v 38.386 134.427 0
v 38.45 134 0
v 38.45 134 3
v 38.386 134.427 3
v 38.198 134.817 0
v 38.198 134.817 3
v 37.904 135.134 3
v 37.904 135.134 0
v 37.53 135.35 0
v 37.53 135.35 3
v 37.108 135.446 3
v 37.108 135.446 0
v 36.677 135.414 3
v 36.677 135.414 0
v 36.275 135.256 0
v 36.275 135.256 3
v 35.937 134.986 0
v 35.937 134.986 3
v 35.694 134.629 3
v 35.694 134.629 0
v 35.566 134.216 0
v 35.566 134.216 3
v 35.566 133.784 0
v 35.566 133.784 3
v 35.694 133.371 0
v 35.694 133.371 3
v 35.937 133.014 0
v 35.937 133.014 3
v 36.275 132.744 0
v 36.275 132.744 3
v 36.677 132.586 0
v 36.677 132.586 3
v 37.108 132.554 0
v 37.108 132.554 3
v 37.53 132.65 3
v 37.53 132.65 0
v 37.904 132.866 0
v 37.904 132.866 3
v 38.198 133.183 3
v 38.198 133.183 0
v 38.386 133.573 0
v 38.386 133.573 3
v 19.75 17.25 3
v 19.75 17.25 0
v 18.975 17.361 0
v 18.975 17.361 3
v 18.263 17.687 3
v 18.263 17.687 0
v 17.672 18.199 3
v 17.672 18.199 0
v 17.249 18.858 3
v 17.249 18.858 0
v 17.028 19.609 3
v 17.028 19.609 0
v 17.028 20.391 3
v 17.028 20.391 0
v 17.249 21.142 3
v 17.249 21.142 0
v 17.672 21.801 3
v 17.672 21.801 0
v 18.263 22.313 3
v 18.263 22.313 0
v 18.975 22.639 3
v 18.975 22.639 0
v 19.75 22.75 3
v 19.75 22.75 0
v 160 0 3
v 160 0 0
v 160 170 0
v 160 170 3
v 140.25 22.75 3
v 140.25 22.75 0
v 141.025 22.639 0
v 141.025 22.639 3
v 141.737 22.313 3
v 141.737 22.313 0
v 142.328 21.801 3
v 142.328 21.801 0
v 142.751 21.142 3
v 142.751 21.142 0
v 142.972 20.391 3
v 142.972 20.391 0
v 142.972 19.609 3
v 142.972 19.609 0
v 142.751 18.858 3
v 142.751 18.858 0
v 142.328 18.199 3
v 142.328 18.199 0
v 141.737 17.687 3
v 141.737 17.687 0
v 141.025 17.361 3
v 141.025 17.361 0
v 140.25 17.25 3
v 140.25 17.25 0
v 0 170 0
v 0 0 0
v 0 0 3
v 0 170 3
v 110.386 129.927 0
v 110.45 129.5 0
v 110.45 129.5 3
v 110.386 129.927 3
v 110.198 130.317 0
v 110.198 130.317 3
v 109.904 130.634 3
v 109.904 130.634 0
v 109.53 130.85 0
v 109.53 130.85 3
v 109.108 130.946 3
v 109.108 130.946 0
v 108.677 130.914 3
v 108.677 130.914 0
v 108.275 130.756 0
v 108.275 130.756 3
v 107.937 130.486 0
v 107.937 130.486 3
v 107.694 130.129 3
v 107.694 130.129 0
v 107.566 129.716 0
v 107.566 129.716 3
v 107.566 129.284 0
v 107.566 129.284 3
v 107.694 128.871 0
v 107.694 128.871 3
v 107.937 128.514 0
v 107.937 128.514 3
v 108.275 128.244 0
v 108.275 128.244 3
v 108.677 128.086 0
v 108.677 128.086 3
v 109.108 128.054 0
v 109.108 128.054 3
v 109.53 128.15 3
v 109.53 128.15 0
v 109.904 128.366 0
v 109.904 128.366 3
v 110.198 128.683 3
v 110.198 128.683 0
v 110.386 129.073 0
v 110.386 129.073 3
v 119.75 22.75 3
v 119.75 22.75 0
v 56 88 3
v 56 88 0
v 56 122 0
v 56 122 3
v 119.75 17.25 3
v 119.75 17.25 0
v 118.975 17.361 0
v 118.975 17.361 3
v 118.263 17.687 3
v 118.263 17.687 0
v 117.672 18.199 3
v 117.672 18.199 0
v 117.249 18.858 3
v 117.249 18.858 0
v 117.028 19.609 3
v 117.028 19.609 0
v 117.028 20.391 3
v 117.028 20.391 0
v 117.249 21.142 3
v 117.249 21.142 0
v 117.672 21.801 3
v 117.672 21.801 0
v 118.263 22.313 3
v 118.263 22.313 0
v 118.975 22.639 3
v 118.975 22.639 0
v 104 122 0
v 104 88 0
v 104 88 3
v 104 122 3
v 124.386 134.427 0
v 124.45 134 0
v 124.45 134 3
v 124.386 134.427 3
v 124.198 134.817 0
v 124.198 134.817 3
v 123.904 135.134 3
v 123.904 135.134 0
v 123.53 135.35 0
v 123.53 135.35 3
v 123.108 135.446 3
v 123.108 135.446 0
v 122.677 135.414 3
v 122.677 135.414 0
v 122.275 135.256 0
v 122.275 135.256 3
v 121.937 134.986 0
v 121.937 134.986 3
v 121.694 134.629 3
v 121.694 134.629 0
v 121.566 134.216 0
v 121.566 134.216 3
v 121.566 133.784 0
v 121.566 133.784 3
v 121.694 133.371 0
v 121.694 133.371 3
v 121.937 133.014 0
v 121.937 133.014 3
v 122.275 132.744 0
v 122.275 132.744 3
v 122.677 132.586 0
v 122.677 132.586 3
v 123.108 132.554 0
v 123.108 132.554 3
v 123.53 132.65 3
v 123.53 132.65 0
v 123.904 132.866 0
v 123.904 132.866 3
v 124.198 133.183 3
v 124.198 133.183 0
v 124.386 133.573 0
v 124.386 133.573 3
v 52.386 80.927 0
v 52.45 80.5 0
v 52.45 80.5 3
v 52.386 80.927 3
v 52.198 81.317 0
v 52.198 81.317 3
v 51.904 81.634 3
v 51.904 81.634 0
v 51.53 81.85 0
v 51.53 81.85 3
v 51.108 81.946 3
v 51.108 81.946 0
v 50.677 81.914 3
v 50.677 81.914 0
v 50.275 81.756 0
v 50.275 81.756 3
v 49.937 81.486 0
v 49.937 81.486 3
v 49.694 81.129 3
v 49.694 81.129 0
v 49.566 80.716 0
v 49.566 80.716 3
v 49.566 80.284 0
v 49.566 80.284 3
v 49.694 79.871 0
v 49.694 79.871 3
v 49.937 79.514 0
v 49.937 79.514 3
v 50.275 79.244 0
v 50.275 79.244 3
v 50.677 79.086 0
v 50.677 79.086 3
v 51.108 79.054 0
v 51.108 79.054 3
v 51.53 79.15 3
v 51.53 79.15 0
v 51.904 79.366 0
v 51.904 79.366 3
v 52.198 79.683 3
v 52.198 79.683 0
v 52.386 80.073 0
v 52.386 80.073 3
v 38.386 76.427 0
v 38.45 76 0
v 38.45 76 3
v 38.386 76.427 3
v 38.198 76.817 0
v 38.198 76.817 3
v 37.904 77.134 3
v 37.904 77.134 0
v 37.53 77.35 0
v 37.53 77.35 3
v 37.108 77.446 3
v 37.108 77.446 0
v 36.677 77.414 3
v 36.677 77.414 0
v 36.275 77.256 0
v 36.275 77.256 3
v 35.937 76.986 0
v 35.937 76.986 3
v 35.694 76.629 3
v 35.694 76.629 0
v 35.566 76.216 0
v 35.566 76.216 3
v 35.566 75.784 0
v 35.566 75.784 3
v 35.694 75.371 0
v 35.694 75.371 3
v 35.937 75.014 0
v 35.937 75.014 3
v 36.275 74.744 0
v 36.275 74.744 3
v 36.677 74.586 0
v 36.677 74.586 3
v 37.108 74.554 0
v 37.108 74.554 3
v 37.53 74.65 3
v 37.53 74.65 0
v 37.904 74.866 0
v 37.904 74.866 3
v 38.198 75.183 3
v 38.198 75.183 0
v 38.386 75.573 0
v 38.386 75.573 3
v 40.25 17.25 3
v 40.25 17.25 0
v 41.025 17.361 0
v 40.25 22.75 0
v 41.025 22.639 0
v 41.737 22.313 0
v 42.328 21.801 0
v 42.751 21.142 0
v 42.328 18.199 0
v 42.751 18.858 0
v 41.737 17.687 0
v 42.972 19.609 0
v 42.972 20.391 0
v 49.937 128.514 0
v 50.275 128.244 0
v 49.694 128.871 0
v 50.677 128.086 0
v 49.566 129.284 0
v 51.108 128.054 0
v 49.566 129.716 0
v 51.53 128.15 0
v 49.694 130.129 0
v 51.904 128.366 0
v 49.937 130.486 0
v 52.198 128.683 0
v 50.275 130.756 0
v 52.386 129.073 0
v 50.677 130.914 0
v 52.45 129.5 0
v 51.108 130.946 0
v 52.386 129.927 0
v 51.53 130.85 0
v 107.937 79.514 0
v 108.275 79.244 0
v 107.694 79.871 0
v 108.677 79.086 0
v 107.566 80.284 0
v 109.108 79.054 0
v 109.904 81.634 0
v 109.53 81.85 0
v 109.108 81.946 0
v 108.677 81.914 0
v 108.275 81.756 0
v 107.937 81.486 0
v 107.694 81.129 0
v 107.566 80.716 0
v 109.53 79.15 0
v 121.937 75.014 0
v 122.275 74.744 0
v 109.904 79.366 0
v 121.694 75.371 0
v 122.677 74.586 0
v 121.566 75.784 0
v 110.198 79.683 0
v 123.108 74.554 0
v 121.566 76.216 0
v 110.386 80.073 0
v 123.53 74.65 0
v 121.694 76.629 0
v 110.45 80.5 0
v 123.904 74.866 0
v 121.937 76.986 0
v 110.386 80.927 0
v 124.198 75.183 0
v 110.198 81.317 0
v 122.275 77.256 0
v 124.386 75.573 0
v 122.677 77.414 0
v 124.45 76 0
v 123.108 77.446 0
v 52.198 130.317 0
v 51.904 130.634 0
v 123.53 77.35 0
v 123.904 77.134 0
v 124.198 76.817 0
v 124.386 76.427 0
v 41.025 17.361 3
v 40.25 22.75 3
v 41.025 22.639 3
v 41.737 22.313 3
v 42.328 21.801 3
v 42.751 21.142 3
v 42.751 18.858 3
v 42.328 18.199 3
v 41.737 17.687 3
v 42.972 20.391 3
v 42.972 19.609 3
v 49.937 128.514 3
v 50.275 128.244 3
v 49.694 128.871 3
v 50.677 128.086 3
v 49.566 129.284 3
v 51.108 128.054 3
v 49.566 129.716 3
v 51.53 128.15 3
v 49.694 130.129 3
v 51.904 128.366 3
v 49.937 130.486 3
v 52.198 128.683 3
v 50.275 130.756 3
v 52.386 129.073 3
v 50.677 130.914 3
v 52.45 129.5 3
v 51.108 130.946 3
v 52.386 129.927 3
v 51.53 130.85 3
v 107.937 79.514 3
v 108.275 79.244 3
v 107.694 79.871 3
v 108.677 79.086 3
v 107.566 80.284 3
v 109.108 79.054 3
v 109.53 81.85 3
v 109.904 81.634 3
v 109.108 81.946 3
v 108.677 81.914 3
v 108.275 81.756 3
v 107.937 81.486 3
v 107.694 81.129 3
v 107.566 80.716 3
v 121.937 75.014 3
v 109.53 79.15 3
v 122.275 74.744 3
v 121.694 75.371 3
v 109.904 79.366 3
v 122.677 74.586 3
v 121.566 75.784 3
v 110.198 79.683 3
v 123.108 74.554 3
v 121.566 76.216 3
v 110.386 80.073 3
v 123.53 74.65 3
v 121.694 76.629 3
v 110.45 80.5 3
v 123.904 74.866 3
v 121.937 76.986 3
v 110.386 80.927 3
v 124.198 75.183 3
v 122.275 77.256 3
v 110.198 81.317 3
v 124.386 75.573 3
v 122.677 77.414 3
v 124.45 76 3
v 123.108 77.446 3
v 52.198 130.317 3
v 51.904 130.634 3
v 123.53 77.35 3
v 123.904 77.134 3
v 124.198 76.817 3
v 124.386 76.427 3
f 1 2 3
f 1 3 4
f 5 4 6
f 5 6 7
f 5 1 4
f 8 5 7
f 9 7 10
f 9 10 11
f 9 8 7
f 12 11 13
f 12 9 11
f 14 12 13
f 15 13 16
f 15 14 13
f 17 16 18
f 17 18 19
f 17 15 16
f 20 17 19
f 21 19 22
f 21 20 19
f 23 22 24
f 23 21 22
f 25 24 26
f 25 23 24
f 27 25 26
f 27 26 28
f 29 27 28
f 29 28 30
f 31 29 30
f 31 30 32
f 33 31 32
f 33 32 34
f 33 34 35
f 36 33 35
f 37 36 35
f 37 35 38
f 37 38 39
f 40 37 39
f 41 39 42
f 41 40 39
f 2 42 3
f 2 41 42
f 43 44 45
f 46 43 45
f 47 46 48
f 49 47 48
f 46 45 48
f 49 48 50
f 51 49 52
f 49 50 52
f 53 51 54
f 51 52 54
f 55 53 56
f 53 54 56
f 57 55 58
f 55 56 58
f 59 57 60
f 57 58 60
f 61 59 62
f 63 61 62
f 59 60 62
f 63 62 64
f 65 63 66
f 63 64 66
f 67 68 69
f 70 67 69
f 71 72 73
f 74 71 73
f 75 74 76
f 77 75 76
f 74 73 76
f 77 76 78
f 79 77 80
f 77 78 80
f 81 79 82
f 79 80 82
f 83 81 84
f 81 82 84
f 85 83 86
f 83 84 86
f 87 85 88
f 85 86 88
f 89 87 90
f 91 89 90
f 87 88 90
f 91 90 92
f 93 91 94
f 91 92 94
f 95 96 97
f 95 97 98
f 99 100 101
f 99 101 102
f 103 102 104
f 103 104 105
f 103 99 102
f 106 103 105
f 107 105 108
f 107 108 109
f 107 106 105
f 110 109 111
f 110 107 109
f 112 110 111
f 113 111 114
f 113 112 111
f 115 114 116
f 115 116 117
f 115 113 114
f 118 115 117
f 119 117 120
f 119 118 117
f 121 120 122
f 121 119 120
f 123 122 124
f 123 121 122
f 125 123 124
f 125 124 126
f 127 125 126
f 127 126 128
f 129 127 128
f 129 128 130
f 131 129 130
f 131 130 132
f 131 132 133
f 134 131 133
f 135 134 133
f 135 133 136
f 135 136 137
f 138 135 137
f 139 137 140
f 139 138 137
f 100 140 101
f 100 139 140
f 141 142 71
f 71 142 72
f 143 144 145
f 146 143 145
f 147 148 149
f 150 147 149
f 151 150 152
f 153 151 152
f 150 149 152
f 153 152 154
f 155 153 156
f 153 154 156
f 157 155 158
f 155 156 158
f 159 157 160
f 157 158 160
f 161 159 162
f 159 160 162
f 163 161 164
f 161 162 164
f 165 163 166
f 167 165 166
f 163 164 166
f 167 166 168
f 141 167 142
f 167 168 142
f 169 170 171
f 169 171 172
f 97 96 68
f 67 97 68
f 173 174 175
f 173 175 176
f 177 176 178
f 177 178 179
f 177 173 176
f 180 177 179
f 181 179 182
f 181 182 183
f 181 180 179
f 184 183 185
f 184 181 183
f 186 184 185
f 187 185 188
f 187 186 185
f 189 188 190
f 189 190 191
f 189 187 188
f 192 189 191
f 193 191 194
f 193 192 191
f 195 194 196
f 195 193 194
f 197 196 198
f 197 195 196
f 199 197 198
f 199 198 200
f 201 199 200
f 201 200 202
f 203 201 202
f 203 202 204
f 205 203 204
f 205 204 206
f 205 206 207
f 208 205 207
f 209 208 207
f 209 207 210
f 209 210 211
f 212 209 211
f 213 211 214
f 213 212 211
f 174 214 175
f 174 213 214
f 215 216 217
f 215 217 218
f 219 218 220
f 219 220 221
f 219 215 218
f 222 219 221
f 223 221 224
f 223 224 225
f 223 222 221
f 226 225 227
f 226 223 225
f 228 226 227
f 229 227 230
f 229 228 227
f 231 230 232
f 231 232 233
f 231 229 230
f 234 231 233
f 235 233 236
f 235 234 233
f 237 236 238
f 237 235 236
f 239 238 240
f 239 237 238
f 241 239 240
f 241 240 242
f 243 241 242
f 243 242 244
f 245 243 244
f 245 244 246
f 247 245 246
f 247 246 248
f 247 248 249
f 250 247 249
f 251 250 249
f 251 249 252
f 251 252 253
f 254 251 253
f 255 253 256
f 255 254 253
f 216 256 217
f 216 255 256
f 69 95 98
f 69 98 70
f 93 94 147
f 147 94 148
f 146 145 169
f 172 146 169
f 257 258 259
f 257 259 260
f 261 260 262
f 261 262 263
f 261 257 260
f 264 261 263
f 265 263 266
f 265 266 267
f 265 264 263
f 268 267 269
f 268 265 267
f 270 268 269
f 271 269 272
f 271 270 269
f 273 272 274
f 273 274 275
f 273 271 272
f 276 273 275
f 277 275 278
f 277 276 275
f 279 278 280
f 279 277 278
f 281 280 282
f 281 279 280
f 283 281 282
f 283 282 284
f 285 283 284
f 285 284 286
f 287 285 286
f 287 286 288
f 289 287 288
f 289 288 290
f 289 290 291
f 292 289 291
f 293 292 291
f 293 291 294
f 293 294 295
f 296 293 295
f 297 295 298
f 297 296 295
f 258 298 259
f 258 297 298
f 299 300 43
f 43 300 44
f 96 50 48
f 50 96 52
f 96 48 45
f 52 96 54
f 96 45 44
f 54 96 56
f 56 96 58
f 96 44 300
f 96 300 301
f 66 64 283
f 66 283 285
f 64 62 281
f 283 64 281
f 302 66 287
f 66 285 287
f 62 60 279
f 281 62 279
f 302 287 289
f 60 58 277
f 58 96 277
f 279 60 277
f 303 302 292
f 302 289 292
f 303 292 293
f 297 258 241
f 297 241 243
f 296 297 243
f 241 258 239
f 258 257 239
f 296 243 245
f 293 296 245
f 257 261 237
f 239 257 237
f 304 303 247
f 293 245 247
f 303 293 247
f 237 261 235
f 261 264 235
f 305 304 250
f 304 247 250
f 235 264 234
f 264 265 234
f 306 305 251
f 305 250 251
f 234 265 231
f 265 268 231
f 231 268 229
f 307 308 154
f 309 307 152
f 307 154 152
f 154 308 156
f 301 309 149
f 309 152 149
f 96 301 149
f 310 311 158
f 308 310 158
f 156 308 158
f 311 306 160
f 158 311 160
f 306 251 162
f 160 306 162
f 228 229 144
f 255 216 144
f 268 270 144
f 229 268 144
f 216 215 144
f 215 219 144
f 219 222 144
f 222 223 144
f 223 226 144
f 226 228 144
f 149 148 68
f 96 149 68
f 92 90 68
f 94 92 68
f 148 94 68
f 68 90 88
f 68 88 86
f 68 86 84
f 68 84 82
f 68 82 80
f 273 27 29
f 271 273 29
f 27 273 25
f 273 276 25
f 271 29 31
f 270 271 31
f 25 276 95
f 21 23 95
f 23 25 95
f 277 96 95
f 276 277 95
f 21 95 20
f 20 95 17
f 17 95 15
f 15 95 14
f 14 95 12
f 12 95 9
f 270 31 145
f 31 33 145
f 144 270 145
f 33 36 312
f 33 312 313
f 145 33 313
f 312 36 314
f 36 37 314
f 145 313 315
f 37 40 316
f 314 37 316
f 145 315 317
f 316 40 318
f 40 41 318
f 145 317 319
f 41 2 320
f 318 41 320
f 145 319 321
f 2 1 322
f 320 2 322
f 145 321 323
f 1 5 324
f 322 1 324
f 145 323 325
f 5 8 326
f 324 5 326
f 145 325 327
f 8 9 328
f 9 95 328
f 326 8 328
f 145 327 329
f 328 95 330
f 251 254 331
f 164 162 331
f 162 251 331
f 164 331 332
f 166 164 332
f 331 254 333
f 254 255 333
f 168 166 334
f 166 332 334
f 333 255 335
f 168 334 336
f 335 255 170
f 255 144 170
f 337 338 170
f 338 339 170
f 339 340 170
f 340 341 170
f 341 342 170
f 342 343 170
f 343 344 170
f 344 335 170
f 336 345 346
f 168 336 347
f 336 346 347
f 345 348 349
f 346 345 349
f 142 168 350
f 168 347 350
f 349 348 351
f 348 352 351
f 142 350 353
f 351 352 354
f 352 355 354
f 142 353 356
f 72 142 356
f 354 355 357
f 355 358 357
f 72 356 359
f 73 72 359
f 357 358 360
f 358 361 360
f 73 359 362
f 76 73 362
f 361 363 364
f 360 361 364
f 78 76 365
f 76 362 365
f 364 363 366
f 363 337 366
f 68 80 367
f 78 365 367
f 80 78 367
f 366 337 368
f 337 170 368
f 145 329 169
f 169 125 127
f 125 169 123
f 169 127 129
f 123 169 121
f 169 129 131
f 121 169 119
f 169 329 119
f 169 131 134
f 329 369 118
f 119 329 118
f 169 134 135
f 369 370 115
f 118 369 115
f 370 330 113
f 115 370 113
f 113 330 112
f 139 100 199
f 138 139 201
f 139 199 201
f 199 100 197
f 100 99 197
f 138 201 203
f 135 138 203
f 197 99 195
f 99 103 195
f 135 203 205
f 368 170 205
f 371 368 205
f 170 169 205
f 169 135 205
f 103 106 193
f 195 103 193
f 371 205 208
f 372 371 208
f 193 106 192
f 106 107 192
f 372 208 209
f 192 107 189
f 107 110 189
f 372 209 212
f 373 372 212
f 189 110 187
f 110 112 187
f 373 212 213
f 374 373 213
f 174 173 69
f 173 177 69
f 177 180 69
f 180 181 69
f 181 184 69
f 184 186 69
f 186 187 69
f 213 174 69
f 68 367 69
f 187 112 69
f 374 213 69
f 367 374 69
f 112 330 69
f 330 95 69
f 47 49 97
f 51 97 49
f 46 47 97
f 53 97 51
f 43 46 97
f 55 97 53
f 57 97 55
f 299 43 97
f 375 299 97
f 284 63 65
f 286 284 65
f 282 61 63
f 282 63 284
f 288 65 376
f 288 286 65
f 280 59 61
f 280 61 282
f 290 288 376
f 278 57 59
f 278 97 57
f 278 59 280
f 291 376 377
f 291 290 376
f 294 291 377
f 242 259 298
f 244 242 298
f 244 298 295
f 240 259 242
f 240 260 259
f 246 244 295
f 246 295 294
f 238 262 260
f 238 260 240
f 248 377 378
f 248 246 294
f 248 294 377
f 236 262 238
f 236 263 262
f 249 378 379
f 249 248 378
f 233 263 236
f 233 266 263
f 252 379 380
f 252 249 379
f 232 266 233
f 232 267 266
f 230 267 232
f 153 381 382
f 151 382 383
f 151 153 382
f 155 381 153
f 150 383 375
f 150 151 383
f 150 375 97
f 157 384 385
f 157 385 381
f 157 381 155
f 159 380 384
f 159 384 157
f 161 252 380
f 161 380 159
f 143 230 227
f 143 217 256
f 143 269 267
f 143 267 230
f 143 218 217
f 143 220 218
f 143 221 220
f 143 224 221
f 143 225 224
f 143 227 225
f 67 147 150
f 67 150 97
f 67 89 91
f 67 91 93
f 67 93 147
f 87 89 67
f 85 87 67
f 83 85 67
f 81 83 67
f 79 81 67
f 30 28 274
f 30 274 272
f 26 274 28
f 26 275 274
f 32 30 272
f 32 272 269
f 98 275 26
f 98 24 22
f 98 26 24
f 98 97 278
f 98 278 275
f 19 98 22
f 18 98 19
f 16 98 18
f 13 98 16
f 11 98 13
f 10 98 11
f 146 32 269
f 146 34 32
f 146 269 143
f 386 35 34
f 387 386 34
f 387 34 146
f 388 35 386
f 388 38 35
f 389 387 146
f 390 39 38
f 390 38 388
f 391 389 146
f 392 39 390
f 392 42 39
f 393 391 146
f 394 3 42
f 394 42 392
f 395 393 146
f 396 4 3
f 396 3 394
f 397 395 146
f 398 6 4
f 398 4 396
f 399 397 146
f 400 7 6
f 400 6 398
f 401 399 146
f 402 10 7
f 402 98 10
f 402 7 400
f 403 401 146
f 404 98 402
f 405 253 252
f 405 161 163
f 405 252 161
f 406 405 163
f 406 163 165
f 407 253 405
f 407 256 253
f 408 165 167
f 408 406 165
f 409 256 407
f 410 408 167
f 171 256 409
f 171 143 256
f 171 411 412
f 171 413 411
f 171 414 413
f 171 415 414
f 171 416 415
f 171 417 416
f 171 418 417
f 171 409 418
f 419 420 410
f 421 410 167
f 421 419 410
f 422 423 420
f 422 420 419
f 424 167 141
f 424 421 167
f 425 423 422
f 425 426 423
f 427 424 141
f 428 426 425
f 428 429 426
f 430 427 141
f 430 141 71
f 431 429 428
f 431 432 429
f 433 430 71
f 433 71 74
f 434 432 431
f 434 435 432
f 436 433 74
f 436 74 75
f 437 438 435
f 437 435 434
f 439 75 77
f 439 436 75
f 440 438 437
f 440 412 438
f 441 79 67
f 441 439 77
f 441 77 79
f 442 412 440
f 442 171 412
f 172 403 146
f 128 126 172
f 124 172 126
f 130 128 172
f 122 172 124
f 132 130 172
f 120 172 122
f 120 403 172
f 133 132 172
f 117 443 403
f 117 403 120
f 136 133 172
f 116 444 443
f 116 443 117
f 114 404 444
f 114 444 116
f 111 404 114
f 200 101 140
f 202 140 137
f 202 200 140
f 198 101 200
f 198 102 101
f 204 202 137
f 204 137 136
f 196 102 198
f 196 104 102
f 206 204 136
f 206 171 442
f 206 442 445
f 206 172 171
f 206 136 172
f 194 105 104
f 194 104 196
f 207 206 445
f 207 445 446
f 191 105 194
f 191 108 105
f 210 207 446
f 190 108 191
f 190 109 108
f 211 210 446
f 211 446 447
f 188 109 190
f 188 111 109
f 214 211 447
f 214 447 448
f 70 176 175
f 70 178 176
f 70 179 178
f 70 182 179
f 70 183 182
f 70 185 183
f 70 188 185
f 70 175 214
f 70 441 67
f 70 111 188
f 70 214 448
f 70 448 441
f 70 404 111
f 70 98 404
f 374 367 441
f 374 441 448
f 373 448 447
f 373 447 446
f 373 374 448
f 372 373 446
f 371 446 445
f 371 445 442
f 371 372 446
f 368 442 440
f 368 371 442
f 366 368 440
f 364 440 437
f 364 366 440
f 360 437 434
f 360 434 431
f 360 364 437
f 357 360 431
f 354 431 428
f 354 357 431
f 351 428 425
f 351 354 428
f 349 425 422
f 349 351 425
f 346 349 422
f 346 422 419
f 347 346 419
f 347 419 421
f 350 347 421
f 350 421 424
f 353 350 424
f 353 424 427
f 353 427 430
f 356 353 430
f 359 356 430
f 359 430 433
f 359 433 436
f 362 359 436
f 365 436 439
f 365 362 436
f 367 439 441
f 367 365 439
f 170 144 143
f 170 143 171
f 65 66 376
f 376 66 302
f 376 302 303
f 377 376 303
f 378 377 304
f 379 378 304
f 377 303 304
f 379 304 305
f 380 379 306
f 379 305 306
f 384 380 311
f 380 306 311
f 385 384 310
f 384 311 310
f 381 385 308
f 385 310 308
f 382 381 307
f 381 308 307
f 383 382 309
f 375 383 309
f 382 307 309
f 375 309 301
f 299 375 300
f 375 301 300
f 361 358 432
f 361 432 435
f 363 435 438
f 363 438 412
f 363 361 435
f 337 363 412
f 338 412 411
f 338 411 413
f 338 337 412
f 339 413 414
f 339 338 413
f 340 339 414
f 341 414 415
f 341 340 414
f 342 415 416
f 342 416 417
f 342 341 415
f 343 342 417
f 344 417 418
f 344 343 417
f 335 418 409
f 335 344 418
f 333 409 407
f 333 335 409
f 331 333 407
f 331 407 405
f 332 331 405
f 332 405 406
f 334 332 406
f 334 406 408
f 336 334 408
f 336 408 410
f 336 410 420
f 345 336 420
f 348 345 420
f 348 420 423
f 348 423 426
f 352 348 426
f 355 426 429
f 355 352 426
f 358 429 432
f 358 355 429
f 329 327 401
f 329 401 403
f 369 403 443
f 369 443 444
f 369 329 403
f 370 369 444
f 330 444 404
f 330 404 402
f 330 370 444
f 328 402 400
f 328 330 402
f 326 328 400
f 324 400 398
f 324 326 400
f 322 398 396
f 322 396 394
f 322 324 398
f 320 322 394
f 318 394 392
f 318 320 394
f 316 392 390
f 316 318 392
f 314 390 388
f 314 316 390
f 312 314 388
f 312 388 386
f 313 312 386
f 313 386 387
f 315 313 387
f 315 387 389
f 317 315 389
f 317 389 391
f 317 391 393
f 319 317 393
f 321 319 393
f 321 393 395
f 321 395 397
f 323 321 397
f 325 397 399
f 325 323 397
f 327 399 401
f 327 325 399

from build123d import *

# Parameters (mm, degrees)
COMPUTE_COMBO_PLATE_W   = 160
COMPUTE_COMBO_PLATE_H   = 170
COMPUTE_COMBO_PLATE_R   = 1.45
COMPUTE_COMBO_PLATE_W_2 = 48
COMPUTE_COMBO_PLATE_H_2 = 34
F_3MM_DEPTH             = 3


with BuildPart() as part:
    # 外形与孔位_compute_combo_plate → 板厚_3mm (new body)
    with BuildSketch(Plane.XY):
        with Locations((80, 85)):
            Rectangle(COMPUTE_COMBO_PLATE_W, COMPUTE_COMBO_PLATE_H)
        with Locations((51, 80.5)):
            Circle(COMPUTE_COMBO_PLATE_R, mode=Mode.SUBTRACT)
        with Locations((51, 129.5)):
            Circle(COMPUTE_COMBO_PLATE_R, mode=Mode.SUBTRACT)
        with Locations((109, 80.5)):
            Circle(COMPUTE_COMBO_PLATE_R, mode=Mode.SUBTRACT)
        with Locations((109, 129.5)):
            Circle(COMPUTE_COMBO_PLATE_R, mode=Mode.SUBTRACT)
        with Locations((37, 76)):
            Circle(COMPUTE_COMBO_PLATE_R, mode=Mode.SUBTRACT)
        with Locations((37, 134)):
            Circle(COMPUTE_COMBO_PLATE_R, mode=Mode.SUBTRACT)
        with Locations((123, 76)):
            Circle(COMPUTE_COMBO_PLATE_R, mode=Mode.SUBTRACT)
        with Locations((123, 134)):
            Circle(COMPUTE_COMBO_PLATE_R, mode=Mode.SUBTRACT)
        with Locations((80, 105)):
            Rectangle(COMPUTE_COMBO_PLATE_W_2, COMPUTE_COMBO_PLATE_H_2, mode=Mode.SUBTRACT)
        with BuildLine():
            Line((19.75, 22.75), (40.25, 22.75))
            ThreePointArc((40.25, 22.75), (43, 20), (40.25, 17.25))
            Line((40.25, 17.25), (19.75, 17.25))
            ThreePointArc((19.75, 17.25), (17, 20), (19.75, 22.75))
        make_face(mode=Mode.SUBTRACT)
        with BuildLine():
            Line((119.75, 22.75), (140.25, 22.75))
            ThreePointArc((140.25, 22.75), (143, 20), (140.25, 17.25))
            Line((140.25, 17.25), (119.75, 17.25))
            ThreePointArc((119.75, 17.25), (117, 20), (119.75, 22.75))
        make_face(mode=Mode.SUBTRACT)
    extrude(amount=F_3MM_DEPTH)


solid = part.part
